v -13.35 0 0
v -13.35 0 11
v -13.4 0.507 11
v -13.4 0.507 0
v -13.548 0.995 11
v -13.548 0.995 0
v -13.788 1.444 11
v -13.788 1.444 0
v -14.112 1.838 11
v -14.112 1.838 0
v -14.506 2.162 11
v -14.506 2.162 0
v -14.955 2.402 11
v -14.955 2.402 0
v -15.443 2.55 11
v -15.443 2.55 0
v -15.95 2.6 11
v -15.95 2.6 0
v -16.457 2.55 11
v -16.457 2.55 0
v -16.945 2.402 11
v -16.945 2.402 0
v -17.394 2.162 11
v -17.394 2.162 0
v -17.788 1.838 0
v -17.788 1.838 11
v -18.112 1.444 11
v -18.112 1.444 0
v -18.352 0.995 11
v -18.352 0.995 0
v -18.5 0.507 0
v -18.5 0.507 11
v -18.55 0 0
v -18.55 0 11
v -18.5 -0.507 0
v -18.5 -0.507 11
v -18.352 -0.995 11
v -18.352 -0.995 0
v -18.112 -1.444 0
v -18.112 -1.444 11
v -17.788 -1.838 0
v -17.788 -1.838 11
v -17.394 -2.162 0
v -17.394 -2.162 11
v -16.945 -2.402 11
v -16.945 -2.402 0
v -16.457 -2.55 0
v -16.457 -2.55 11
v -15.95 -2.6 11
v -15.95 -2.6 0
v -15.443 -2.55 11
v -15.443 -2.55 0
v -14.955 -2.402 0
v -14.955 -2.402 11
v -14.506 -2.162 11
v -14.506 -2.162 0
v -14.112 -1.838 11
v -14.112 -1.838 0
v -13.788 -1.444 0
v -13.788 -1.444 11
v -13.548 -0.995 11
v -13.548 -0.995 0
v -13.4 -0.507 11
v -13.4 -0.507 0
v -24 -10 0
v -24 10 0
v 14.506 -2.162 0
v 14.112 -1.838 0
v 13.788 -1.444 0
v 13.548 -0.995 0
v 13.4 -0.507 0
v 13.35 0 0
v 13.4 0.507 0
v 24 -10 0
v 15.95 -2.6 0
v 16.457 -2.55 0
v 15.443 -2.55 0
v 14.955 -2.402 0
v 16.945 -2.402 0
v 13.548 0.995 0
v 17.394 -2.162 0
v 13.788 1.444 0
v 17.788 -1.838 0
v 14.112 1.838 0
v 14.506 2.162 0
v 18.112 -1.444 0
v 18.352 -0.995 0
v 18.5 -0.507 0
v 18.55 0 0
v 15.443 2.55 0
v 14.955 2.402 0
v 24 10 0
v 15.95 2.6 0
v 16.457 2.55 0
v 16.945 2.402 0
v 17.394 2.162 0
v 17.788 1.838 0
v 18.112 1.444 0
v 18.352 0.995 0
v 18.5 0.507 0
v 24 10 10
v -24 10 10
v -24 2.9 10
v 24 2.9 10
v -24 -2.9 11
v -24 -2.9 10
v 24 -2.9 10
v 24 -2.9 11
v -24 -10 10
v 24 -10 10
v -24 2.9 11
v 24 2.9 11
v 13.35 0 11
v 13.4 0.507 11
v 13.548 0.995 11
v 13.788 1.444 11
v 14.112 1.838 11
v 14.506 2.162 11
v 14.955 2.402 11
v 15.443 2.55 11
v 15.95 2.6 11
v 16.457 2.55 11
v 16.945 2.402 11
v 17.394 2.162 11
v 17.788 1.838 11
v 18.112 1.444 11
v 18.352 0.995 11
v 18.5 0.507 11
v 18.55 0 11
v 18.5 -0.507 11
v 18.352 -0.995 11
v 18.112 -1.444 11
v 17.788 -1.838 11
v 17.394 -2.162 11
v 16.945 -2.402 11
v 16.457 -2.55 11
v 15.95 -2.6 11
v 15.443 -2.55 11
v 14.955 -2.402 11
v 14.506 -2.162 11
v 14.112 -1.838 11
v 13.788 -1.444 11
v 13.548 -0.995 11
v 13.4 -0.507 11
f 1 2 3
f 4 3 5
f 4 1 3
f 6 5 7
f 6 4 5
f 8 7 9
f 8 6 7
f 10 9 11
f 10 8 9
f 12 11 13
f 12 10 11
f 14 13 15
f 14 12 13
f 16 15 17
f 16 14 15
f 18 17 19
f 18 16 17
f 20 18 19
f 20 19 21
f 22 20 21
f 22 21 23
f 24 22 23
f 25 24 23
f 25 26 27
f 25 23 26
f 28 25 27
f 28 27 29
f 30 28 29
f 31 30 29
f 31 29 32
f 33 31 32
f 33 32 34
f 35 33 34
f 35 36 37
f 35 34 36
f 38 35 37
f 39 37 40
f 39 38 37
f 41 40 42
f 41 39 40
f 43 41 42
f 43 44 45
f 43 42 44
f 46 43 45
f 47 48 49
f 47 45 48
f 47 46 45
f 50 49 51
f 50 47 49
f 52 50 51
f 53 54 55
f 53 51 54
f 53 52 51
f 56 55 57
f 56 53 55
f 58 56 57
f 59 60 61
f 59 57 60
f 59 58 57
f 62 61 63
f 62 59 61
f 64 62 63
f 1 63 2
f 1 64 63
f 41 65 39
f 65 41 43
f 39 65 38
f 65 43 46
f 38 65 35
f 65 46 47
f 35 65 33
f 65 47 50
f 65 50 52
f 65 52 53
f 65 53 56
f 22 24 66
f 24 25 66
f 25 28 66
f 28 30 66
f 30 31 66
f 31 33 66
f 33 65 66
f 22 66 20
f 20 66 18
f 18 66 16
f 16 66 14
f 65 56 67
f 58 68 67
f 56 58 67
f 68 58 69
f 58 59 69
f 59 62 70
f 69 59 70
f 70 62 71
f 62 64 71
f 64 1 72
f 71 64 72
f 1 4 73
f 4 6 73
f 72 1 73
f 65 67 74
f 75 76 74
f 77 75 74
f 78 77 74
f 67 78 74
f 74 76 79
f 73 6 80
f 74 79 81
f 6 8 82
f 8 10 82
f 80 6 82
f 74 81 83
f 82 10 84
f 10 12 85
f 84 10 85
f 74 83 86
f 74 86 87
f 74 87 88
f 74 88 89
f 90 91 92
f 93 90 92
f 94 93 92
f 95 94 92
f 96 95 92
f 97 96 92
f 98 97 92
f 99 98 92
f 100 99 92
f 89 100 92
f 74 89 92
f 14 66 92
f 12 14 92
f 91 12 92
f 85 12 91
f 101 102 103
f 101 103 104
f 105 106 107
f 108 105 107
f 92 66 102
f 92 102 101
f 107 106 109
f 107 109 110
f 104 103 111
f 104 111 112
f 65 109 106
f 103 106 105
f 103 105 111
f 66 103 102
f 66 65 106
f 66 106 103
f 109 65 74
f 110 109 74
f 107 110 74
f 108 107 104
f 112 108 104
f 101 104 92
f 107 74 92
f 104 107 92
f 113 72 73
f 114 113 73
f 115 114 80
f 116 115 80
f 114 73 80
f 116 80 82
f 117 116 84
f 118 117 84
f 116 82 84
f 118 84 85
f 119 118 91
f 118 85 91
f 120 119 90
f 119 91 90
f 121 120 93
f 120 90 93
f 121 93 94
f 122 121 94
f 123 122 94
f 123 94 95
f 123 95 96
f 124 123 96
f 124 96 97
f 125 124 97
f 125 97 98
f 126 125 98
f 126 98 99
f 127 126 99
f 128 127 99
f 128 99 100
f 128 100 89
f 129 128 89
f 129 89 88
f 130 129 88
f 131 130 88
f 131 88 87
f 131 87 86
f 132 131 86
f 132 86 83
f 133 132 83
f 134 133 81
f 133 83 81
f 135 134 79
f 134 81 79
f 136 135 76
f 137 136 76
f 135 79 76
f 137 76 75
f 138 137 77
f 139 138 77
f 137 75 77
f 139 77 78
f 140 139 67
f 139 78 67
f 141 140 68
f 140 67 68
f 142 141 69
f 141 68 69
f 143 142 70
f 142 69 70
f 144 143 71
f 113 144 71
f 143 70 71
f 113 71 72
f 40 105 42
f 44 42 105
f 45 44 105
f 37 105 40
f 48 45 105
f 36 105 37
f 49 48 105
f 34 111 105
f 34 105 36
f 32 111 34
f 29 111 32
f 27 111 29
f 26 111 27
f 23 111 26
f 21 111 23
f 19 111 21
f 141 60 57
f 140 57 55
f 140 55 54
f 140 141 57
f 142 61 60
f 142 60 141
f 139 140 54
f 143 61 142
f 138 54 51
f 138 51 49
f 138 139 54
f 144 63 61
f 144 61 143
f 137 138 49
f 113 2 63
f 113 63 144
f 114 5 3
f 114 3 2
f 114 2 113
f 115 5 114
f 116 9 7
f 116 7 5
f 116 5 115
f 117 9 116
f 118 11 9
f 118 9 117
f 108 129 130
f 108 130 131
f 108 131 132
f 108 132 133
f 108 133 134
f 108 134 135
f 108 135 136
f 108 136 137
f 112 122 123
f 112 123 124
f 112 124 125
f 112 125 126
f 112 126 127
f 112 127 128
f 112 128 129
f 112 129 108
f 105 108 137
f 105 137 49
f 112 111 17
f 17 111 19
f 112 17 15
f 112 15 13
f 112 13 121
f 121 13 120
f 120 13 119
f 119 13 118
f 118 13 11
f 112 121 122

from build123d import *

# Parameters (mm, degrees)
SKETCH1_W           = 48
SKETCH1_H           = 20
BOSS_EXTRUDE1_DEPTH = 10
SKETCH4_W           = 48
SKETCH4_H           = 5.8
BOSS_EXTRUDE2_DEPTH = 1
SKETCH2_R           = 2.6
CUT_EXTRUDE1_DEPTH  = 12


with BuildPart() as part:
    # Sketch1 → Boss-Extrude1 (new body)
    with BuildSketch(Plane.XY):
        Rectangle(SKETCH1_W, SKETCH1_H)
    extrude(amount=BOSS_EXTRUDE1_DEPTH)

    # Sketch4 → Boss-Extrude2 (add)
    with BuildSketch(Plane.XY.offset(10)):
        Rectangle(SKETCH4_W, SKETCH4_H)
    extrude(amount=BOSS_EXTRUDE2_DEPTH)

    # Sketch2 → Cut-Extrude1 (cut, through all)
    with BuildSketch(Plane.XY):
        with Locations((-15.95, 0)):
            Circle(SKETCH2_R)
    cut_extrude1 = extrude(amount=CUT_EXTRUDE1_DEPTH, mode=Mode.SUBTRACT)

    # Mirror1: Cut-Extrude1 across plane
    add(cut_extrude1.mirror(Plane(origin=(0, 0, 0), x_dir=(0, 0, 1), z_dir=(1, 0, 0))), mode=Mode.SUBTRACT)


solid = part.part
